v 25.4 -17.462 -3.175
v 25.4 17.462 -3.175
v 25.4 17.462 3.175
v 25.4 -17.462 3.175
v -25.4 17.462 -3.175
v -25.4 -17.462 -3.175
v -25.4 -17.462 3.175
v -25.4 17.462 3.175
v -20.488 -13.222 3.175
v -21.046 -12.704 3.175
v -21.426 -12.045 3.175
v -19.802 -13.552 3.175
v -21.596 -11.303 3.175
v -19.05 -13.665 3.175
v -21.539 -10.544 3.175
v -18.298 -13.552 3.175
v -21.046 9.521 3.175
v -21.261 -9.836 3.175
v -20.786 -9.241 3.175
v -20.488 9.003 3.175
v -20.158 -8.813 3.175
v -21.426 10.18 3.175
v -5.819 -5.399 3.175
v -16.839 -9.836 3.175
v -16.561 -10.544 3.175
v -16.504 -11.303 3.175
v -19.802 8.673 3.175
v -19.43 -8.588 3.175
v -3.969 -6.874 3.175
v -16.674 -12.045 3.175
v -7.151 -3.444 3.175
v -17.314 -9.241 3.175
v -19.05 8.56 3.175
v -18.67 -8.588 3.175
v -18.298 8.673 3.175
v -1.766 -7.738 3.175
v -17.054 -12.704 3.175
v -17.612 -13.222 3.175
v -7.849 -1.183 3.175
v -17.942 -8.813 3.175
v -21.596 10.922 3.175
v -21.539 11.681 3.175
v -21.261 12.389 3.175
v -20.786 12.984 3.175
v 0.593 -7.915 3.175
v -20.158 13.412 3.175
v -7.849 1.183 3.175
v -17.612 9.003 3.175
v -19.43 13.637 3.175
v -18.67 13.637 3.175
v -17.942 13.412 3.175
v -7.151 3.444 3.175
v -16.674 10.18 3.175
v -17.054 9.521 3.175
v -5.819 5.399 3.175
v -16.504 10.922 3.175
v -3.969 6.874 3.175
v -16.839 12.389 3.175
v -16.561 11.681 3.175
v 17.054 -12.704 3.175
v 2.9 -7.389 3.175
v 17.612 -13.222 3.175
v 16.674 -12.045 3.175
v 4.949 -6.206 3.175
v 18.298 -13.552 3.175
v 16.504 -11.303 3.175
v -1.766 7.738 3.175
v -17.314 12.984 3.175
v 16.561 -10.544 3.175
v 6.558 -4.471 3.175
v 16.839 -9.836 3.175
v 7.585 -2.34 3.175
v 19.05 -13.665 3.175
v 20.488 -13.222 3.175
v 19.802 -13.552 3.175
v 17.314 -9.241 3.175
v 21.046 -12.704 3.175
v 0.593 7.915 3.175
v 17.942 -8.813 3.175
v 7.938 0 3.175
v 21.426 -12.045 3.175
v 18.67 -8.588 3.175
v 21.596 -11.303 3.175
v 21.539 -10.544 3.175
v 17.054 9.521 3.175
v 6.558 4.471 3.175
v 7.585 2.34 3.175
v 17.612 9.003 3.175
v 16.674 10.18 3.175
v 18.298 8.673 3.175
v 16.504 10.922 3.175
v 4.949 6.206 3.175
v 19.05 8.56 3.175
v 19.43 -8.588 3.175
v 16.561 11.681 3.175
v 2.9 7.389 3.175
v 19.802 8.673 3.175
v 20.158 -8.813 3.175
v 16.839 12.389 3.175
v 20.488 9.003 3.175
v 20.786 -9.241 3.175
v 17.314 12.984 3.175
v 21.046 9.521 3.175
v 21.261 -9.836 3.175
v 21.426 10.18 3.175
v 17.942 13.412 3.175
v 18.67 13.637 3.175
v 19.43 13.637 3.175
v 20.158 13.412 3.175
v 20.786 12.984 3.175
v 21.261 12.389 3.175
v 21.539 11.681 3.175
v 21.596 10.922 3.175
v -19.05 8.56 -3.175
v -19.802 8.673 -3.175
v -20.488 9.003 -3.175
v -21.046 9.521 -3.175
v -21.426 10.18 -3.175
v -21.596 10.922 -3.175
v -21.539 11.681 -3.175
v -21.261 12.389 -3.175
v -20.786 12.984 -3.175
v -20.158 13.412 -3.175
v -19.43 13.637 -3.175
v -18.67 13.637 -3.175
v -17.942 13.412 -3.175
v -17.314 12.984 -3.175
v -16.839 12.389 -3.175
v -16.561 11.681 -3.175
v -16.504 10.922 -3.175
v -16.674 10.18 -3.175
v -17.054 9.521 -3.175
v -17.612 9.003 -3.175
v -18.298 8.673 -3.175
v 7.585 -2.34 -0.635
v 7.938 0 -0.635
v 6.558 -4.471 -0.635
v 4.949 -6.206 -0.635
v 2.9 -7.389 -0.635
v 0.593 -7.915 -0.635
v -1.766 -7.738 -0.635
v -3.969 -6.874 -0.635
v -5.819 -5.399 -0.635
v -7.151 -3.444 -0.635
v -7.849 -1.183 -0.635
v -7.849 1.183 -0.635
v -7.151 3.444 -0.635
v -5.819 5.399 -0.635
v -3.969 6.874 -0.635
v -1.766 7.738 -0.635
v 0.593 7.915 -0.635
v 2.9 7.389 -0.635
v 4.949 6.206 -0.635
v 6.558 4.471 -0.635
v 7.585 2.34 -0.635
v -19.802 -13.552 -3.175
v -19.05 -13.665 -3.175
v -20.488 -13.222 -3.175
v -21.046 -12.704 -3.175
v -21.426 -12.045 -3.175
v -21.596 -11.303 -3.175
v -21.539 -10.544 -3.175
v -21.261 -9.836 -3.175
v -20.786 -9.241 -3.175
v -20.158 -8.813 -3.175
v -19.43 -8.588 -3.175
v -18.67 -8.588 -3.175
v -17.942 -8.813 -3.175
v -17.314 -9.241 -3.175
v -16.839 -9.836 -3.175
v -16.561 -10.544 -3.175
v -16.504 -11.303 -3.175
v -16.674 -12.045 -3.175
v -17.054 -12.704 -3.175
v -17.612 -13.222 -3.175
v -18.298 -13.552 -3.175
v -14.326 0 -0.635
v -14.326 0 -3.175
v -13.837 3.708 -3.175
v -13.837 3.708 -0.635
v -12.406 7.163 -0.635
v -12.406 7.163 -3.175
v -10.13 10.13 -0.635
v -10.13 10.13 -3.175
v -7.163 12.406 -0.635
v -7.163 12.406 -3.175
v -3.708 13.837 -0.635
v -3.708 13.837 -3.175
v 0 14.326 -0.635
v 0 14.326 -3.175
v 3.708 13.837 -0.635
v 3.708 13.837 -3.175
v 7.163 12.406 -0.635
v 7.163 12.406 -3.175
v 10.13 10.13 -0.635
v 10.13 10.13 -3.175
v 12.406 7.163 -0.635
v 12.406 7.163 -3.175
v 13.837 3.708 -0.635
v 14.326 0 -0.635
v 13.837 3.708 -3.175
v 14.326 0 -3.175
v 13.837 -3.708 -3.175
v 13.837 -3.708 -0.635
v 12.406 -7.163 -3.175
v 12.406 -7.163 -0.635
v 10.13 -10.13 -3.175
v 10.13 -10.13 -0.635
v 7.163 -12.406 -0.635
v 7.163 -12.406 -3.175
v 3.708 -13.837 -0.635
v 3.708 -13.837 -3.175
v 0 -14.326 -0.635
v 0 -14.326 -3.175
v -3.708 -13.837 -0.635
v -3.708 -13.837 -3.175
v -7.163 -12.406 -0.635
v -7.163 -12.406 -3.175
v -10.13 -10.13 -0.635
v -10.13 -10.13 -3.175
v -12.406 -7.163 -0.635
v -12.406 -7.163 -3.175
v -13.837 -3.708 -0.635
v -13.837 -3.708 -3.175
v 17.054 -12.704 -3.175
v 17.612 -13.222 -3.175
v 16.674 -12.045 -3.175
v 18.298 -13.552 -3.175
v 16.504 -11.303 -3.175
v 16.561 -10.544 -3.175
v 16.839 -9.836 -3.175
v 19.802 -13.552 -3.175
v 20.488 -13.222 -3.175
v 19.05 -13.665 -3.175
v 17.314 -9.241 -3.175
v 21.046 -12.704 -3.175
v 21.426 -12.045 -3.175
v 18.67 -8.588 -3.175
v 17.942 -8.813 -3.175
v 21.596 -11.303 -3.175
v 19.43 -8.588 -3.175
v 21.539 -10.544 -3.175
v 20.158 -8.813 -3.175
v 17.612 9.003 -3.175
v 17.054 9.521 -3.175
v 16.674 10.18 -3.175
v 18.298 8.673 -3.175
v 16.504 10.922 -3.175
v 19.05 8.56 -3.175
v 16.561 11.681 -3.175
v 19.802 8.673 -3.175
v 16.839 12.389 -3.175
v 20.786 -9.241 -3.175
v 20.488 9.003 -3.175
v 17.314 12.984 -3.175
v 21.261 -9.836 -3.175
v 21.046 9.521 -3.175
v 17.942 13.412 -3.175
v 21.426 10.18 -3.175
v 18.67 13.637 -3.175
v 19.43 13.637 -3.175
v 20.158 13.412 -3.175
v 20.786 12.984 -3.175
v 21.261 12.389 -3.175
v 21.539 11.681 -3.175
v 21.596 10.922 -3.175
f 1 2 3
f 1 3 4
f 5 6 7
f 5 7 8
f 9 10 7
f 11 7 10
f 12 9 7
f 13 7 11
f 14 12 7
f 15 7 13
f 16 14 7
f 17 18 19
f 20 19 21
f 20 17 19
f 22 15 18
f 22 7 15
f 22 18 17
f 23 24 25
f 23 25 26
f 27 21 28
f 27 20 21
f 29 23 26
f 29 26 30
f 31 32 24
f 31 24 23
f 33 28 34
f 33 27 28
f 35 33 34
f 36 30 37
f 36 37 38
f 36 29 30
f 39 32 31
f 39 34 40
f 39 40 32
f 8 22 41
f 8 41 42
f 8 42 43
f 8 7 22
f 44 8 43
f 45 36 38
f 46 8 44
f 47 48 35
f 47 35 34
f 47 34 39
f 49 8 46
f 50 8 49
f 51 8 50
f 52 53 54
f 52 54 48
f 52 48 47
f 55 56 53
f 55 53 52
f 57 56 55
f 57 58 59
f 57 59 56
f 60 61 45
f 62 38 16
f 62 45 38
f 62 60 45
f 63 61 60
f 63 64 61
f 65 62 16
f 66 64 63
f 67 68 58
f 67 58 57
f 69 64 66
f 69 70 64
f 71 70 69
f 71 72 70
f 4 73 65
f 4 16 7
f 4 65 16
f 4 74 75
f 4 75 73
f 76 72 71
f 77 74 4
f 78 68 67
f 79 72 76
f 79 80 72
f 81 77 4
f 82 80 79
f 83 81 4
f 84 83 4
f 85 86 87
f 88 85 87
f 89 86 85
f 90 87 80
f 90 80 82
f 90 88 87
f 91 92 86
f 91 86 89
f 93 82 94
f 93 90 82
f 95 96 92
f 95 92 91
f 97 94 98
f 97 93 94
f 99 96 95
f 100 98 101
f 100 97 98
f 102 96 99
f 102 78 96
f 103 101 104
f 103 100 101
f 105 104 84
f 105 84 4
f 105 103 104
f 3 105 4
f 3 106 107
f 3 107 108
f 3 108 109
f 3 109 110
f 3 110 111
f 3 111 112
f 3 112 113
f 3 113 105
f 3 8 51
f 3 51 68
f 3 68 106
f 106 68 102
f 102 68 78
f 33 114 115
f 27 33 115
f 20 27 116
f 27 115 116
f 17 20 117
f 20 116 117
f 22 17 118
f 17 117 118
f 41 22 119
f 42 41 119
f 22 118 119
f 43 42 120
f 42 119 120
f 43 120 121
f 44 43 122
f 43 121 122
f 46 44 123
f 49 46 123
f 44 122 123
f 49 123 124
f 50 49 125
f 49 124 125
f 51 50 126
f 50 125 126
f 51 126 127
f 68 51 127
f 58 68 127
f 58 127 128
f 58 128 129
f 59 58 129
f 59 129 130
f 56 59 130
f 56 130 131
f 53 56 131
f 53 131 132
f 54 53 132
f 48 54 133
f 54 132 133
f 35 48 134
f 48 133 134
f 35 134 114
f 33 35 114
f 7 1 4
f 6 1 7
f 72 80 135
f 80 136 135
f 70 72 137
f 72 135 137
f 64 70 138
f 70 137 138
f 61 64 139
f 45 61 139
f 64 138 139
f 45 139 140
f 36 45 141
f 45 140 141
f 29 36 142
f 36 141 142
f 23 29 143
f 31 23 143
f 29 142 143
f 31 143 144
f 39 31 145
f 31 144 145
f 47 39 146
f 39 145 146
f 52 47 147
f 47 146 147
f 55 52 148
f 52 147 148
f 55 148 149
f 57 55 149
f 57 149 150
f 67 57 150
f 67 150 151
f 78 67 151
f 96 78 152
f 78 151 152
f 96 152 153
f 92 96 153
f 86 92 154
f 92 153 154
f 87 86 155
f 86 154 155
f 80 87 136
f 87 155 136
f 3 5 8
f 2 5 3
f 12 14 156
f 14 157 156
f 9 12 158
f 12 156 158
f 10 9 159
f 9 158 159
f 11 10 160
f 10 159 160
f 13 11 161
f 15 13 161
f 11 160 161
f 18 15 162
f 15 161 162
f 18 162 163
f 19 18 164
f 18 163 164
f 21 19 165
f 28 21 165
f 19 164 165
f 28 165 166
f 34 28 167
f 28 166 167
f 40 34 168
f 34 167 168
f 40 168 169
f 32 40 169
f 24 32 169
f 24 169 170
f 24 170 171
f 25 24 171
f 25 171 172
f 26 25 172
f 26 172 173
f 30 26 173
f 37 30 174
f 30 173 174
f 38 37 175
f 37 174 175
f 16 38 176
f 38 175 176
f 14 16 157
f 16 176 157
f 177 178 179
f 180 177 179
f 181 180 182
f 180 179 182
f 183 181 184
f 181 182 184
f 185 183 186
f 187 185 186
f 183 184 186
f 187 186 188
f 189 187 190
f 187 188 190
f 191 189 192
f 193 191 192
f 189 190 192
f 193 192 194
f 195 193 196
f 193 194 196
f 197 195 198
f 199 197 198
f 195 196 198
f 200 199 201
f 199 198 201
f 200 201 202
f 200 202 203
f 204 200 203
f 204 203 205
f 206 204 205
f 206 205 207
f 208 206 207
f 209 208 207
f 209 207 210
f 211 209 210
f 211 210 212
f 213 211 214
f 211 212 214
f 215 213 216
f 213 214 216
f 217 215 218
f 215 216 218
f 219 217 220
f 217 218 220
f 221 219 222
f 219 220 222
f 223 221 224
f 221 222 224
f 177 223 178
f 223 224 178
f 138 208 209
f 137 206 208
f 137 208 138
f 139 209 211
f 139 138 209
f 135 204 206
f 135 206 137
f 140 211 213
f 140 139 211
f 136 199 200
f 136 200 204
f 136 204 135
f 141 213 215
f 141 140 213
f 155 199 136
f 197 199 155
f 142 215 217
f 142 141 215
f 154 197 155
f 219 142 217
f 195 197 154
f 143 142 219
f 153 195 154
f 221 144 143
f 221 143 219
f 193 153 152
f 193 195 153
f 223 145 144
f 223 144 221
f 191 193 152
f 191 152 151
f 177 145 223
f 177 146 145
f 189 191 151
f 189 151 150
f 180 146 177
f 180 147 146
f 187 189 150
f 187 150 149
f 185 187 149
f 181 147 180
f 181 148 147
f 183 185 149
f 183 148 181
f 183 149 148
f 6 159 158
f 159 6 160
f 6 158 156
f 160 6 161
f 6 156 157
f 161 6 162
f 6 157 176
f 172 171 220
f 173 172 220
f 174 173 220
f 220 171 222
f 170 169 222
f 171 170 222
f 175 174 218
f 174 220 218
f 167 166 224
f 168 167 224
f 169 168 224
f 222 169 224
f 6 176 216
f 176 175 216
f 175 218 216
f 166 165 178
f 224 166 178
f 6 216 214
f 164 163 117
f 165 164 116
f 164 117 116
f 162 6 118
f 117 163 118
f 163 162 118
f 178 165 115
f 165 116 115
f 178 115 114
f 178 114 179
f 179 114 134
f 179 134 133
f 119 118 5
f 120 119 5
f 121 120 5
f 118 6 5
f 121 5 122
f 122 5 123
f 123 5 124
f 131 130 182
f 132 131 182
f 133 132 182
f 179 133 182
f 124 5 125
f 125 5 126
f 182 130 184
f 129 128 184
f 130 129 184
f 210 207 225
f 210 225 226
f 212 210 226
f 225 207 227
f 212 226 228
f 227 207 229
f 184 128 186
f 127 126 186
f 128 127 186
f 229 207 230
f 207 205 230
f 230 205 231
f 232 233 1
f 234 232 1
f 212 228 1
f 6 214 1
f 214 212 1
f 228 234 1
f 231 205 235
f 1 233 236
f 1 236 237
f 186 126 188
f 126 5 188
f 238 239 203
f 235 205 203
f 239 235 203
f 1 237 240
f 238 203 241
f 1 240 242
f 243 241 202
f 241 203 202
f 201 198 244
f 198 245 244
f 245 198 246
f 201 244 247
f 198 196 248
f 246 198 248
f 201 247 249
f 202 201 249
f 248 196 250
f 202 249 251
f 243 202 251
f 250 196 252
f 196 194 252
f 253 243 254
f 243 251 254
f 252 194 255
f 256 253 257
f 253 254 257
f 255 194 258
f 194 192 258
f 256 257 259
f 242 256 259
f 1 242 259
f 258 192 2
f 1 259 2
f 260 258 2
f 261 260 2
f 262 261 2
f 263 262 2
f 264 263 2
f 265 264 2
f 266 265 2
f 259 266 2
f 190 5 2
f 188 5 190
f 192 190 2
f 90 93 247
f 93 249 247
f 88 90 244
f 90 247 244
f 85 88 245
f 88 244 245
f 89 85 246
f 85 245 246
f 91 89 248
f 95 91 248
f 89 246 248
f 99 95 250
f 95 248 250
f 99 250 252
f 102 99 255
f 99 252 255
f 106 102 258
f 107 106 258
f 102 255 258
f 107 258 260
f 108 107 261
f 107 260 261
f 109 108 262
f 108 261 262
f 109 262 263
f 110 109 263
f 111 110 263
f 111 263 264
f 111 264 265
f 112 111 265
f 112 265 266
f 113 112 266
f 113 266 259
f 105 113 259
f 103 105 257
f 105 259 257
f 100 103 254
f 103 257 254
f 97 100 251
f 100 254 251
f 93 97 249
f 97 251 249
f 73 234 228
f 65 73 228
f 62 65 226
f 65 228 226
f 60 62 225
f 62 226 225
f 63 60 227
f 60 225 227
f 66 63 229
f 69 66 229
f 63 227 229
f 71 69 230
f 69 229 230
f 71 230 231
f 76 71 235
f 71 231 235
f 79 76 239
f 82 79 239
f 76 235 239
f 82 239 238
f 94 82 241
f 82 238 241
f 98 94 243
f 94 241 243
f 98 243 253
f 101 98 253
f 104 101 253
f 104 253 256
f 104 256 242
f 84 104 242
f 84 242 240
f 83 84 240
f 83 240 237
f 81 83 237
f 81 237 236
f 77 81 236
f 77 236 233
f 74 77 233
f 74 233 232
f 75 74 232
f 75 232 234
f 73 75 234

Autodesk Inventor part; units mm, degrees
ref_plane "YZ Plane" through (0, 0, 0) normal (1, 0, 0) x (0, 1, 0)
ref_plane "XZ Plane" through (0, 0, 0) normal (0, 1, 0) x (-1, 0, 0)
ref_plane "XY Plane" through (0, 0, 0) normal (0, 0, 1) x (1, 0, 0)
sketch "Sketch1" plane through (0, 0, 0) normal (0, 0, 1) x (1, 0, 0)
  circle A0 centre (0, 0) radius 14.2875 construction
  line L0 (-35.56, 0) -> (35.56, 0) projected
  line L1 (0, -24.4475) -> (0, 24.4475) projected
  line L2 (-25.4, 17.4625) -> (25.4, 17.4625)
  line L3 (25.4, 17.4625) -> (25.4, -17.4625)
  line L4 (25.4, -17.4625) -> (-25.4, -17.4625)
  line L5 (-25.4, -17.4625) -> (-25.4, 17.4625)
  circle A1 centre (0, 0) radius 7.9375
  point P0 (0, 17.4625)
  point P1 (-25.4, 0)
  dimension "d0" = 28.575
  dimension "d1" = 50.8
  dimension "d2" = 34.925
  dimension "d3" = 15.875
extrude "Extrusion1" add sketch "Sketch1" along normal mid plane 6.35 contours L5 L2 L1 A1 L0 | L0 A1 L1 L4 L5 | L1 L2 L3 L0 A1 | A1 L0 L3 L4 L1
sketch "Sketch2" plane through (0, 0, -3.175) normal (0, 0, -1) x (-1, 0, 0)
  circle A0 centre (0, 0) radius 7.9375 projected
  circle A1 centre (0, 0) radius 14.3256
  dimension "d6" = 28.6512
extrude "Bearing seat" cut sketch "Sketch2" against normal blind 2.54
sketch "Sketch3" plane through (0, 0, 3.175) normal (0, 0, 1) x (1, 0, 0)
  line L0 (-25.4, 17.4625) -> (25.4, 17.4625) projected
  line L1 (-25.4, -17.4625) -> (-25.4, 17.4625) projected
  line L2 (-35.56, 0) -> (35.56, 0) projected
  line L3 (0, -24.4475) -> (0, 24.4475) projected
  point P0 (-19.05, 11.1125)
  point P1 (19.05, 11.1125)
  point P2 (-19.05, -11.1125)
  point P3 (19.05, -11.1125)
  dimension "d9" = 6.35
  dimension "d10" = 6.35
hole "Hole1" at (-19.05, 11.1125, 3.175) at (19.05, 11.1125, 3.175) at (-19.05, -11.1125, 3.175) at (19.05, -11.1125, 3.175) direction (0, 0, -1) diameter 5.1054 end through all clearance for "Flat Head Machine Screw (82)" size "#10" standard "Ansi Unified Screw Threads"
properties part number "mount pillow block inner bearing capture"
